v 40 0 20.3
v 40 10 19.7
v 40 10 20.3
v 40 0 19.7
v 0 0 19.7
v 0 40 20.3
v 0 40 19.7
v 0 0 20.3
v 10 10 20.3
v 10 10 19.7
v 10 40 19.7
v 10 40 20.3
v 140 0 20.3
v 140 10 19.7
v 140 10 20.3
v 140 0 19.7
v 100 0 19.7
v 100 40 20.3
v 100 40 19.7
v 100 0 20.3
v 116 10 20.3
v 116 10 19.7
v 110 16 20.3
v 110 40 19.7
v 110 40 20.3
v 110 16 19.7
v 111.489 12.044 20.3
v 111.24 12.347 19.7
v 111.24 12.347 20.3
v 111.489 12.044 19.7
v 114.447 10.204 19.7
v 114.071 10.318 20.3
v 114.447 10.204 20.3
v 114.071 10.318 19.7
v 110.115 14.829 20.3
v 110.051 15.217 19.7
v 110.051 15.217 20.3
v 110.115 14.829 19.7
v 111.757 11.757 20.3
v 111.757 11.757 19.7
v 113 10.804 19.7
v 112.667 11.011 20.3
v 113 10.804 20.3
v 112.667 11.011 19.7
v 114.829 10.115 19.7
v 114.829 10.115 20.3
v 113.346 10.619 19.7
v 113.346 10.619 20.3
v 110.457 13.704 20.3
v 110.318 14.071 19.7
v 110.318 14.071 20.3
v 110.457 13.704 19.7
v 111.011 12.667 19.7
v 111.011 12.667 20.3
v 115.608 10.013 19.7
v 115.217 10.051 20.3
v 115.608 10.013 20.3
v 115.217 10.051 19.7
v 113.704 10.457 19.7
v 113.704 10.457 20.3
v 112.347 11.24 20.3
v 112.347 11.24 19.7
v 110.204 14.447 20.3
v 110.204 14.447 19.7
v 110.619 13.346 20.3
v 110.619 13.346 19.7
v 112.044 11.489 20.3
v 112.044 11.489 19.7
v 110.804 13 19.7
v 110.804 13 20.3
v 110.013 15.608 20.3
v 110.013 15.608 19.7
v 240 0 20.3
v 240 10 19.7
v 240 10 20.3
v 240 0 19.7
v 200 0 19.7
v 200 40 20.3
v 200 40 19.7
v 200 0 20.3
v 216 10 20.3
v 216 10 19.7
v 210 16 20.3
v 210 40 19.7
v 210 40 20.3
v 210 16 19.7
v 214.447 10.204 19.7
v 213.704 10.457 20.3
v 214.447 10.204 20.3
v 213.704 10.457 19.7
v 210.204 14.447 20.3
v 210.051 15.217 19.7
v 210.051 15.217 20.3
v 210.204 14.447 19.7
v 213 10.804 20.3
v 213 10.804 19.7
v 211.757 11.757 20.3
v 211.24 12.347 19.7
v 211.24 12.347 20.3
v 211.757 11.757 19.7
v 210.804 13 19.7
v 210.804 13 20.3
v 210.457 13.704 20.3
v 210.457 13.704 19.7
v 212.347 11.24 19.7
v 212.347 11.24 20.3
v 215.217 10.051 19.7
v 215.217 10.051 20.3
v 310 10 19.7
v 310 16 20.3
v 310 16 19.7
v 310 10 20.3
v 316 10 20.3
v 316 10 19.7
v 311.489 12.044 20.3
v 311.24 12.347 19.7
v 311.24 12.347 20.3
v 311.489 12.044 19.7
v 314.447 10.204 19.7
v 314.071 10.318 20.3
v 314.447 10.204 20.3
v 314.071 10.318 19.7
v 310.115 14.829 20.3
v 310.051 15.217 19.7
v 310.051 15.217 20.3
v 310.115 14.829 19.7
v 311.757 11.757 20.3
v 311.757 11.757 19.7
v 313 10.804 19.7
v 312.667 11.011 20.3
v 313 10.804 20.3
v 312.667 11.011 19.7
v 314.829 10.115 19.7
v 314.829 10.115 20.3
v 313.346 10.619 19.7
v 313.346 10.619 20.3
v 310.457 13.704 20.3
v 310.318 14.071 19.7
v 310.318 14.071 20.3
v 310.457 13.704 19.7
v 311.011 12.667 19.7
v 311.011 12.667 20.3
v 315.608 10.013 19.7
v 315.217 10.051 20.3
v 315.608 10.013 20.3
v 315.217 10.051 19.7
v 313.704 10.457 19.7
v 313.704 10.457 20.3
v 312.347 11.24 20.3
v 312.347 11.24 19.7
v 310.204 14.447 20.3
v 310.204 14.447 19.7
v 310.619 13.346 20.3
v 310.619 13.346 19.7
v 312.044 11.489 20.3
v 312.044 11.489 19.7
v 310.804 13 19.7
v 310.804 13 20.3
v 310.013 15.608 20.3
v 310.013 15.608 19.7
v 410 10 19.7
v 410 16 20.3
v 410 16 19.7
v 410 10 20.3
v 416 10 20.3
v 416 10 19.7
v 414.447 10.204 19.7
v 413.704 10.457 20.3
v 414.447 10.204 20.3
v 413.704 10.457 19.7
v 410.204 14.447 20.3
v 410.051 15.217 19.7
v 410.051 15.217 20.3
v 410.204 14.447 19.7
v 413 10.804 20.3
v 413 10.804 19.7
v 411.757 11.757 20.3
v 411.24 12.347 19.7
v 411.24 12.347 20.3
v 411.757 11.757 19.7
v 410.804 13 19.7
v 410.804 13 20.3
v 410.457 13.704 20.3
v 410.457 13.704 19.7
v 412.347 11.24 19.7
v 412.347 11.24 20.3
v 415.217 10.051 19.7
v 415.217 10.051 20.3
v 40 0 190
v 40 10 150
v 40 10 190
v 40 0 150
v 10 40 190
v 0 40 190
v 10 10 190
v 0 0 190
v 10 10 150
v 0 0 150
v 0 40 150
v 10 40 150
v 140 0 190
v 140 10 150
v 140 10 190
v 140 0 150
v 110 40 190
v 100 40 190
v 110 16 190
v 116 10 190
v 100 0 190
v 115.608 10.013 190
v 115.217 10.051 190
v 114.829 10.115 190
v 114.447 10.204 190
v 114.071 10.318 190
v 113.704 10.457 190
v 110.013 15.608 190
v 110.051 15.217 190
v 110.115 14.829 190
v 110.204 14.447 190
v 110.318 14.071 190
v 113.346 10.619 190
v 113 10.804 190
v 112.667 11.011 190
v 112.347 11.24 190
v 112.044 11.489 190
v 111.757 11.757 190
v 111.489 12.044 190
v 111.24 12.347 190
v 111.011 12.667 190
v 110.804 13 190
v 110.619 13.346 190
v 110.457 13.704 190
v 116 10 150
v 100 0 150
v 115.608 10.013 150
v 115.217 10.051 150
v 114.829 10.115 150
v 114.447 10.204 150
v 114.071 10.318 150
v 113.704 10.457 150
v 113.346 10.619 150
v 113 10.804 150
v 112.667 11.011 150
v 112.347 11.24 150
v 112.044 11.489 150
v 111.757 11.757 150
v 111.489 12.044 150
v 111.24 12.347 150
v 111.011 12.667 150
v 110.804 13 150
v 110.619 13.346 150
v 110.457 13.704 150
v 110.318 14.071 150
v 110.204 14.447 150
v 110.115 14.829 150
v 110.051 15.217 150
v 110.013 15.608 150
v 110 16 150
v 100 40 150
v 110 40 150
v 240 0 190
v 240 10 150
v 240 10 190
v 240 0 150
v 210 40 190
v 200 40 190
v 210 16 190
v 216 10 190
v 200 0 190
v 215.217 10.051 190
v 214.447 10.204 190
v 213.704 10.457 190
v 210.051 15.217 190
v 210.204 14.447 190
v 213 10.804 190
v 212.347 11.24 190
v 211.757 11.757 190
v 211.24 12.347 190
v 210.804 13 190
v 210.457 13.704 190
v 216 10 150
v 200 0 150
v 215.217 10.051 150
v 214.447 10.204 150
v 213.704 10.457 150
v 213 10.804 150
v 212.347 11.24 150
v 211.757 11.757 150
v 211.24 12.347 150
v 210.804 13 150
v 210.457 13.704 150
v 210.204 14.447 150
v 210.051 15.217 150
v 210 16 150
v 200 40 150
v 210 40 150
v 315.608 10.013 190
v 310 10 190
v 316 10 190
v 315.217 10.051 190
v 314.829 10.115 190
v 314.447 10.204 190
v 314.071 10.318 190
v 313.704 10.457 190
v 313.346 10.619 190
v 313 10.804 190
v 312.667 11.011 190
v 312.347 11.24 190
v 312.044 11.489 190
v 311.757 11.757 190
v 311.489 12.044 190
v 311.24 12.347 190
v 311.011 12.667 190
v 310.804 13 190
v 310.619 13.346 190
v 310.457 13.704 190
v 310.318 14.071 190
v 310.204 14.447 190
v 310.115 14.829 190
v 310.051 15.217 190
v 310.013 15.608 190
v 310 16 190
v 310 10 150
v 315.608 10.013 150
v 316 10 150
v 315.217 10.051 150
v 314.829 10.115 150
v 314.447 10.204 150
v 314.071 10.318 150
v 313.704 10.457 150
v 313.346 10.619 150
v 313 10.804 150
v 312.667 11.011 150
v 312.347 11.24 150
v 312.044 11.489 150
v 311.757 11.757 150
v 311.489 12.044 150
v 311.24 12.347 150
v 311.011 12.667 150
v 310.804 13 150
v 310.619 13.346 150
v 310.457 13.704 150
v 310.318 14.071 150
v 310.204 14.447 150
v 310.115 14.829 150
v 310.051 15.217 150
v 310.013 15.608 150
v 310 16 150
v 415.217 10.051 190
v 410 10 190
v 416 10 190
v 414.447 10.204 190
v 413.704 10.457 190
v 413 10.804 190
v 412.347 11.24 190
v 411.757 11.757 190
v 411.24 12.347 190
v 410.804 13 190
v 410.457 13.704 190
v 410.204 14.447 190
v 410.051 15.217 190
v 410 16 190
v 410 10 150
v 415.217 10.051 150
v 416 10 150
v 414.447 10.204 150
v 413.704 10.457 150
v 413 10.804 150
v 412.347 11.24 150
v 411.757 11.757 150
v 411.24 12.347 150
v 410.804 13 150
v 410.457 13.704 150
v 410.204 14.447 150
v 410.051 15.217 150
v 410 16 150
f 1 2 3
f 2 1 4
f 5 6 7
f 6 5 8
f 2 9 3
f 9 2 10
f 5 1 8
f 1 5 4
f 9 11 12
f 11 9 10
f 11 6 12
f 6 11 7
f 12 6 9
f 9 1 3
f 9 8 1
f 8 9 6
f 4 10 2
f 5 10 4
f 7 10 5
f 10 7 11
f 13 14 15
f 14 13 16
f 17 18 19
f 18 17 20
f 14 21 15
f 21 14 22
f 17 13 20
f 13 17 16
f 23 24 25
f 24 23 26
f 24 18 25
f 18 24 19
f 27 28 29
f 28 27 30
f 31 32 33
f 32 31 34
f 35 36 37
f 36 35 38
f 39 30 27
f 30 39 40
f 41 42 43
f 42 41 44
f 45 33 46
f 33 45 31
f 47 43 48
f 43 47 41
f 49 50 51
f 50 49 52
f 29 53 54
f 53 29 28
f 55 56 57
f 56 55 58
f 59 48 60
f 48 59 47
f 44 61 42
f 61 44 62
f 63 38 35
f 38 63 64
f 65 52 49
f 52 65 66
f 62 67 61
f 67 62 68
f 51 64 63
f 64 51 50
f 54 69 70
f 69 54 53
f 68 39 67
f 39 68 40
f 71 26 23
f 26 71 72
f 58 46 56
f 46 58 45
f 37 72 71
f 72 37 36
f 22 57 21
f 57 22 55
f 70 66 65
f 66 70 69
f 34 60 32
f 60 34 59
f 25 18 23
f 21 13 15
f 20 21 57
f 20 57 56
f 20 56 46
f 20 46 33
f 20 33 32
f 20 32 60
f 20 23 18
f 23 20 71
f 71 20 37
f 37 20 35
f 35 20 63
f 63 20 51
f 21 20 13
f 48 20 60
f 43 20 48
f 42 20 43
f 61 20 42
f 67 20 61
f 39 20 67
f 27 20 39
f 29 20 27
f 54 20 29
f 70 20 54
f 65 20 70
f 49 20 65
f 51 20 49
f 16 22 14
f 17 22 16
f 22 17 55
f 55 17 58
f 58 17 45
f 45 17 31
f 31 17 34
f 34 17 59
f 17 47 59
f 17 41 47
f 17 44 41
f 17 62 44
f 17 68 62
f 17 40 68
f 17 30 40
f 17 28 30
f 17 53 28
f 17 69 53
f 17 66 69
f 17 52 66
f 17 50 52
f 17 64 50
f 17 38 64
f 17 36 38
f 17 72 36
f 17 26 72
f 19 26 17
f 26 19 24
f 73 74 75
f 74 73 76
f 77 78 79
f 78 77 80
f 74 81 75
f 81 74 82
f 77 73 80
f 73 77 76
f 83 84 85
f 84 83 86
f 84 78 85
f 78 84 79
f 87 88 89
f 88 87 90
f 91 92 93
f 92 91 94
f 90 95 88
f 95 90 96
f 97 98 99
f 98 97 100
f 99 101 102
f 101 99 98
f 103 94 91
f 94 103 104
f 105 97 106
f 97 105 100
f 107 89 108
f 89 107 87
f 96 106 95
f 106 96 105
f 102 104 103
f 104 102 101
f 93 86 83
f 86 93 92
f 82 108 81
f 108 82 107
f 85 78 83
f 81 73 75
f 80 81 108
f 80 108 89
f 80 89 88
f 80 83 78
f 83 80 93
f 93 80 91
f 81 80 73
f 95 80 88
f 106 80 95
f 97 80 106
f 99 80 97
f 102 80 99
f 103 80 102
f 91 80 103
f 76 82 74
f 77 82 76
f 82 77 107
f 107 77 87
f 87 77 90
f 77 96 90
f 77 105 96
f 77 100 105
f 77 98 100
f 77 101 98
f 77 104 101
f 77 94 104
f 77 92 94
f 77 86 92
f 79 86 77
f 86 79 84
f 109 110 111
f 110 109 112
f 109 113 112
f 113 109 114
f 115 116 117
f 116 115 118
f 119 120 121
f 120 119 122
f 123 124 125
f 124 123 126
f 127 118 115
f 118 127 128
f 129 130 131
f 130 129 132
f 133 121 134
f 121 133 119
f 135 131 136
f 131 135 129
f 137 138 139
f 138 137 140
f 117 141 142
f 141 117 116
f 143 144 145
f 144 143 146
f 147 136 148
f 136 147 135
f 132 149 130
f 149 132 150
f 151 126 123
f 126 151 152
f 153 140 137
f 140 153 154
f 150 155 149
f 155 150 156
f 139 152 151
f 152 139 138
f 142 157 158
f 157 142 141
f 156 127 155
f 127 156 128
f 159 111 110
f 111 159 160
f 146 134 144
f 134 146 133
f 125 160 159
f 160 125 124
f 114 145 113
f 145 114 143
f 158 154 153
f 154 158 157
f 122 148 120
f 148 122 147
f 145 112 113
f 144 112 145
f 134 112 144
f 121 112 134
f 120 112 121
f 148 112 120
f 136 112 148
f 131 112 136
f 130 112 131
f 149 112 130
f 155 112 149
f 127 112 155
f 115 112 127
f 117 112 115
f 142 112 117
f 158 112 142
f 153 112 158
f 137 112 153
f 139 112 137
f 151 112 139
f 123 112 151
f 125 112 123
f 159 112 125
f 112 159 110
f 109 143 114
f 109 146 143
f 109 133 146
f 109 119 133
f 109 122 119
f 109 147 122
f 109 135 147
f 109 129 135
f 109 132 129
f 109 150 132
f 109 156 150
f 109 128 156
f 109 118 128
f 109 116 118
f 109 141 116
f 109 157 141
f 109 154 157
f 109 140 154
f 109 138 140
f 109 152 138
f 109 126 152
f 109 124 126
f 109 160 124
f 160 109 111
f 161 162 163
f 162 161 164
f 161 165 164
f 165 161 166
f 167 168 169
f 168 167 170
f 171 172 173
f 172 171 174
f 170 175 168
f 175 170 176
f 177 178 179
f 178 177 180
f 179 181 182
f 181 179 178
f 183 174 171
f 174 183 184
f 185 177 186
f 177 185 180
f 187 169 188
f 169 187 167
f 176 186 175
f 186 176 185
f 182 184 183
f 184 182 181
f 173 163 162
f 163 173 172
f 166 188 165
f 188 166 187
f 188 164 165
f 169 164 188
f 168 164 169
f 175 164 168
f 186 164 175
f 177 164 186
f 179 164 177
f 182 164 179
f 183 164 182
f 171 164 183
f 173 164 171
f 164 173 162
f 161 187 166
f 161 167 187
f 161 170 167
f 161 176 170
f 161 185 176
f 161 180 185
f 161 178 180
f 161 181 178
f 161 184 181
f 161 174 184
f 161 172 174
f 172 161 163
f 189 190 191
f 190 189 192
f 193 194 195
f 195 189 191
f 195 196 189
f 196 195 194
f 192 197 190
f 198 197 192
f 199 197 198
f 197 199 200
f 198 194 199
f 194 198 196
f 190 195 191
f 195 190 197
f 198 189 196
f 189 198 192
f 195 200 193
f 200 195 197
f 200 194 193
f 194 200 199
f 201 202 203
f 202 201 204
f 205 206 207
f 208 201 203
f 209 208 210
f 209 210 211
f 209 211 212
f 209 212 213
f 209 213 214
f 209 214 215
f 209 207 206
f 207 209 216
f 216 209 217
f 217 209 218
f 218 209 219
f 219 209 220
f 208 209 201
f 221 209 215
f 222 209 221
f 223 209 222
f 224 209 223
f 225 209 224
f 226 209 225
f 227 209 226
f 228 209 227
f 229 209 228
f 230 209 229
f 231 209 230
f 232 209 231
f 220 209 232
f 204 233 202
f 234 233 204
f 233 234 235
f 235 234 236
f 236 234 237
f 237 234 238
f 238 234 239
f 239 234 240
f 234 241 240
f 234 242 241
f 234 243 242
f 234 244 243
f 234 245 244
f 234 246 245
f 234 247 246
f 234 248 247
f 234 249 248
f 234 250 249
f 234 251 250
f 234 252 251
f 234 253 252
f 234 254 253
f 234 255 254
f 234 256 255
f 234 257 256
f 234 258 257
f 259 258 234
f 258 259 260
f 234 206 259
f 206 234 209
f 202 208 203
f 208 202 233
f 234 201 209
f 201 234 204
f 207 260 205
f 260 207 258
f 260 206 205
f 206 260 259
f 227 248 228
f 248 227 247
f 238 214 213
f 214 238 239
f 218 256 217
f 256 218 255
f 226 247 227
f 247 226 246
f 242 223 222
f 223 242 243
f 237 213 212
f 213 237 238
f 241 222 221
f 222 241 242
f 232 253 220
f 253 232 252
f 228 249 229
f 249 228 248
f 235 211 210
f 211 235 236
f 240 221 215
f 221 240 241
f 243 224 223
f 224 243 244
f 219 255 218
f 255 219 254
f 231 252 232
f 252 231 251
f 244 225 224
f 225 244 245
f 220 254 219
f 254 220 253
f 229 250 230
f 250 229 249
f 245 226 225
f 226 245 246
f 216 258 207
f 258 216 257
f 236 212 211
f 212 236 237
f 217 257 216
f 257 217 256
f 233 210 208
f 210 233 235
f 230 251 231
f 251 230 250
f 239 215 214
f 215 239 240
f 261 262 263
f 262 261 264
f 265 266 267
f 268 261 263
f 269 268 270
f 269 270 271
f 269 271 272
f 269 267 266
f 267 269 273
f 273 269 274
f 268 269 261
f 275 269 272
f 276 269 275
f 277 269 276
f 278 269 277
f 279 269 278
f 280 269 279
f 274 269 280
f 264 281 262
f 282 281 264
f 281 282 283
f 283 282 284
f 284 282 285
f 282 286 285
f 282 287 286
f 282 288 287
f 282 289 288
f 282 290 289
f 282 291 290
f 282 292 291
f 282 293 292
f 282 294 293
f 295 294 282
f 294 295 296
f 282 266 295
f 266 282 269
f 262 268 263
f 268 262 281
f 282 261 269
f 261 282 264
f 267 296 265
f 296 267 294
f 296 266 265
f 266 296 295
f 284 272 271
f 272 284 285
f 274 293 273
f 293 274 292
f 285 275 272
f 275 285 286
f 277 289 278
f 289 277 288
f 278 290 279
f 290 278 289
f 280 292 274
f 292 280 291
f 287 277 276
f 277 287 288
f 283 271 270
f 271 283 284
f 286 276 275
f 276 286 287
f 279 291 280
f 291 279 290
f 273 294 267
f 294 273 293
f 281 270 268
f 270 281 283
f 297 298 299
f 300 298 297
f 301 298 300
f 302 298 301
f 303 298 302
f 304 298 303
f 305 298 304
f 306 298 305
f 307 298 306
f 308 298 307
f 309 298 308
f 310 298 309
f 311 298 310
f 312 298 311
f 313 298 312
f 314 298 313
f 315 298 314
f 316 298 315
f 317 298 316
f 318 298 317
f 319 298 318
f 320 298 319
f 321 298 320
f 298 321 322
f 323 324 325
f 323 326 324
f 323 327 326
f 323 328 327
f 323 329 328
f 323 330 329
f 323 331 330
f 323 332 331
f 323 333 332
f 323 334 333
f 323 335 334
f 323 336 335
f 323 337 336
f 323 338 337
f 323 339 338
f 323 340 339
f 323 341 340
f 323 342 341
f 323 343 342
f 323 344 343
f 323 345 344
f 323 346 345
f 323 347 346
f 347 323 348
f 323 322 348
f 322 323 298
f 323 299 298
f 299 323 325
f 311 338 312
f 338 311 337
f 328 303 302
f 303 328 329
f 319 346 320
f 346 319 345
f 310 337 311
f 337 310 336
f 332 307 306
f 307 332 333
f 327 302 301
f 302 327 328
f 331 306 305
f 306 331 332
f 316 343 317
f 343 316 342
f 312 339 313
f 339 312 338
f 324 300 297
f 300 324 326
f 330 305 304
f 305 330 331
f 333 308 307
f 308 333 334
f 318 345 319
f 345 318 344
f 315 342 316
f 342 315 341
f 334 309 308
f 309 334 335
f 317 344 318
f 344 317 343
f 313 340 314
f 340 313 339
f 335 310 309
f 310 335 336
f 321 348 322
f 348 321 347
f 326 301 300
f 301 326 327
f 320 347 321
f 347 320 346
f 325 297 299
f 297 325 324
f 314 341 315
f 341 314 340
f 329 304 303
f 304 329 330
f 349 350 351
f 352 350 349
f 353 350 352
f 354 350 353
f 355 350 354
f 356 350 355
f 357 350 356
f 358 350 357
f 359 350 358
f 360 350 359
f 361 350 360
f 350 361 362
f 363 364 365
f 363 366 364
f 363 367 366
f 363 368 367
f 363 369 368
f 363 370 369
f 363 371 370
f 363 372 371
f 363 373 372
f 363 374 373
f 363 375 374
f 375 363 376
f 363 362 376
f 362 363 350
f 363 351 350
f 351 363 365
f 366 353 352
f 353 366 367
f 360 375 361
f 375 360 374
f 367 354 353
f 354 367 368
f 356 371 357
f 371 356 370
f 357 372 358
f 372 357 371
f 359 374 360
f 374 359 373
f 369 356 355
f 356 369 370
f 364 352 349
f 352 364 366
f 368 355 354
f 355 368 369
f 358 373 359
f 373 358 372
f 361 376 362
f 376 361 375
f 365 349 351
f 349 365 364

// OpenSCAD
// file: ../lib/_ref.scad
// -----------------------------------------------------------------------------
// Hand-written reference tools.
//
// These are the known-good answers, built from the classic OpenSCAD idioms
// (corner square - quarter cylinder, annulus prism - torus, ...). They do NOT
// use fillet_tool/round_tool/chamfer_tool/bevel_tool, so they render with a
// stock OpenSCAD and stay a genuinely independent yardstick for the operator.
//
// Sign convention, same as the operator's: a CONCAVE tool (fillet/chamfer) is
// unioned with the model, a CONVEX tool (round/bevel) is subtracted from it.
// -----------------------------------------------------------------------------

// ---- single 90-degree edge running along Z -----------------------------------

// Concave fillet bead. Faces are x = cx (material x < cx) and y = cy (material
// y < cy); the reentrant quadrant opens toward +x,+y. UNION with the model.
// Cross-section = corner square minus a quarter disc.
module ref_fillet_edge_z(cx, cy, r, h, z0 = 0) {
  translate([0, 0, z0])
    difference() {
      translate([cx, cy, 0]) cube([r, r, h]);
      translate([cx + r, cy + r, -1]) cylinder(r = r, h = h + 2);
    }
}

// Convex round tool. Convex corner at (cx,cy), material x < cx & y < cy.
// SUBTRACT from the model; it is the sharp corner sliver outside the arc.
module ref_round_edge_z(cx, cy, r, h, z0 = 0) {
  translate([0, 0, z0])
    difference() {
      translate([cx - r, cy - r, 0]) cube([r, r, h]);
      translate([cx - r, cy - r, -1]) cylinder(r = r, h = h + 2);
    }
}

// Concave chamfer bead — the wedge alone, no arc. UNION with the model.
module ref_chamfer_edge_z(cx, cy, t, h, z0 = 0) {
  translate([0, 0, z0])
    linear_extrude(h)
      polygon([[cx, cy], [cx + t, cy], [cx, cy + t]]);
}

// Convex bevel tool — the flat wedge cut off a convex corner at (cx,cy),
// material x < cx & y < cy. SUBTRACT from the model.
module ref_bevel_edge_z(cx, cy, t, h, z0 = 0) {
  translate([0, 0, z0])
    linear_extrude(h)
      polygon([[cx, cy], [cx - t, cy], [cx, cy - t]]);
}

// ---- closed ring edges around the Z axis -------------------------------------

// Convex mouth of a through hole of radius rh whose face is at z = zf, material
// below the face and outside the hole. SUBTRACT from the model.
// Annulus prism rh..rh+r over z[zf-r,zf], minus the torus at rho=rh+r, z=zf-r.
module ref_round_hole_mouth(rh, zf, r) {
  translate([0, 0, zf - r])
    difference() {
      difference() {
        cylinder(r = rh + r, h = r);
        translate([0, 0, -1]) cylinder(r = rh, h = r + 2);
      }
      rotate_extrude() translate([rh + r, 0]) circle(r = r);
    }
}

// Concave base of a boss of radius rb standing on a face at z = zf, material
// inside the boss and below the face. UNION with the model.
module ref_fillet_boss_base(rb, zf, r) {
  translate([0, 0, zf])
    difference() {
      difference() {
        cylinder(r = rb + r, h = r);
        translate([0, 0, -1]) cylinder(r = rb, h = r + 2);
      }
      rotate_extrude() translate([rb + r, r]) circle(r = r);
    }
}
// main file
// Harness self-test, positive. The "candidate" is not the operator at all: it is
// the same hand-written bead as the reference, tessellated differently ($fn 48
// vs 96). Every check must PASS, which is what proves the comparison tolerates
// tessellation and is not trivially always-failing.

include <../lib/_ref.scad>;
include <../lib/_harness.scad>;

$fn = 64;

H  = 40;
CX = 10;
CY = 10;

CASE_SIGN  = "union";
CASE_SLICE = ["top", H / 2];
CASE_DY    = 120;
//                name     size kind   tol
CASE_VARIANTS = [["small",   6, "ref", 0.12]];

module case_model() {
  cube([40, CY, H]);
  cube([CX, 40, H]);
}

module case_ref_tool()  ref_fillet_edge_z(CX, CY, $case_size, H, $fn = 96);
module case_cand_tool() ref_fillet_edge_z(CX, CY, $case_size, H, $fn = 48);
module case_clip()      fillet_clip_all();

module case_view()
  fillet_case_view(CASE_SIGN, CASE_VARIANTS, CASE_SLICE, CASE_DY)
    { case_model(); case_ref_tool(); case_cand_tool(); case_clip(); }

if (!FILLET_DRIVER) case_view();
